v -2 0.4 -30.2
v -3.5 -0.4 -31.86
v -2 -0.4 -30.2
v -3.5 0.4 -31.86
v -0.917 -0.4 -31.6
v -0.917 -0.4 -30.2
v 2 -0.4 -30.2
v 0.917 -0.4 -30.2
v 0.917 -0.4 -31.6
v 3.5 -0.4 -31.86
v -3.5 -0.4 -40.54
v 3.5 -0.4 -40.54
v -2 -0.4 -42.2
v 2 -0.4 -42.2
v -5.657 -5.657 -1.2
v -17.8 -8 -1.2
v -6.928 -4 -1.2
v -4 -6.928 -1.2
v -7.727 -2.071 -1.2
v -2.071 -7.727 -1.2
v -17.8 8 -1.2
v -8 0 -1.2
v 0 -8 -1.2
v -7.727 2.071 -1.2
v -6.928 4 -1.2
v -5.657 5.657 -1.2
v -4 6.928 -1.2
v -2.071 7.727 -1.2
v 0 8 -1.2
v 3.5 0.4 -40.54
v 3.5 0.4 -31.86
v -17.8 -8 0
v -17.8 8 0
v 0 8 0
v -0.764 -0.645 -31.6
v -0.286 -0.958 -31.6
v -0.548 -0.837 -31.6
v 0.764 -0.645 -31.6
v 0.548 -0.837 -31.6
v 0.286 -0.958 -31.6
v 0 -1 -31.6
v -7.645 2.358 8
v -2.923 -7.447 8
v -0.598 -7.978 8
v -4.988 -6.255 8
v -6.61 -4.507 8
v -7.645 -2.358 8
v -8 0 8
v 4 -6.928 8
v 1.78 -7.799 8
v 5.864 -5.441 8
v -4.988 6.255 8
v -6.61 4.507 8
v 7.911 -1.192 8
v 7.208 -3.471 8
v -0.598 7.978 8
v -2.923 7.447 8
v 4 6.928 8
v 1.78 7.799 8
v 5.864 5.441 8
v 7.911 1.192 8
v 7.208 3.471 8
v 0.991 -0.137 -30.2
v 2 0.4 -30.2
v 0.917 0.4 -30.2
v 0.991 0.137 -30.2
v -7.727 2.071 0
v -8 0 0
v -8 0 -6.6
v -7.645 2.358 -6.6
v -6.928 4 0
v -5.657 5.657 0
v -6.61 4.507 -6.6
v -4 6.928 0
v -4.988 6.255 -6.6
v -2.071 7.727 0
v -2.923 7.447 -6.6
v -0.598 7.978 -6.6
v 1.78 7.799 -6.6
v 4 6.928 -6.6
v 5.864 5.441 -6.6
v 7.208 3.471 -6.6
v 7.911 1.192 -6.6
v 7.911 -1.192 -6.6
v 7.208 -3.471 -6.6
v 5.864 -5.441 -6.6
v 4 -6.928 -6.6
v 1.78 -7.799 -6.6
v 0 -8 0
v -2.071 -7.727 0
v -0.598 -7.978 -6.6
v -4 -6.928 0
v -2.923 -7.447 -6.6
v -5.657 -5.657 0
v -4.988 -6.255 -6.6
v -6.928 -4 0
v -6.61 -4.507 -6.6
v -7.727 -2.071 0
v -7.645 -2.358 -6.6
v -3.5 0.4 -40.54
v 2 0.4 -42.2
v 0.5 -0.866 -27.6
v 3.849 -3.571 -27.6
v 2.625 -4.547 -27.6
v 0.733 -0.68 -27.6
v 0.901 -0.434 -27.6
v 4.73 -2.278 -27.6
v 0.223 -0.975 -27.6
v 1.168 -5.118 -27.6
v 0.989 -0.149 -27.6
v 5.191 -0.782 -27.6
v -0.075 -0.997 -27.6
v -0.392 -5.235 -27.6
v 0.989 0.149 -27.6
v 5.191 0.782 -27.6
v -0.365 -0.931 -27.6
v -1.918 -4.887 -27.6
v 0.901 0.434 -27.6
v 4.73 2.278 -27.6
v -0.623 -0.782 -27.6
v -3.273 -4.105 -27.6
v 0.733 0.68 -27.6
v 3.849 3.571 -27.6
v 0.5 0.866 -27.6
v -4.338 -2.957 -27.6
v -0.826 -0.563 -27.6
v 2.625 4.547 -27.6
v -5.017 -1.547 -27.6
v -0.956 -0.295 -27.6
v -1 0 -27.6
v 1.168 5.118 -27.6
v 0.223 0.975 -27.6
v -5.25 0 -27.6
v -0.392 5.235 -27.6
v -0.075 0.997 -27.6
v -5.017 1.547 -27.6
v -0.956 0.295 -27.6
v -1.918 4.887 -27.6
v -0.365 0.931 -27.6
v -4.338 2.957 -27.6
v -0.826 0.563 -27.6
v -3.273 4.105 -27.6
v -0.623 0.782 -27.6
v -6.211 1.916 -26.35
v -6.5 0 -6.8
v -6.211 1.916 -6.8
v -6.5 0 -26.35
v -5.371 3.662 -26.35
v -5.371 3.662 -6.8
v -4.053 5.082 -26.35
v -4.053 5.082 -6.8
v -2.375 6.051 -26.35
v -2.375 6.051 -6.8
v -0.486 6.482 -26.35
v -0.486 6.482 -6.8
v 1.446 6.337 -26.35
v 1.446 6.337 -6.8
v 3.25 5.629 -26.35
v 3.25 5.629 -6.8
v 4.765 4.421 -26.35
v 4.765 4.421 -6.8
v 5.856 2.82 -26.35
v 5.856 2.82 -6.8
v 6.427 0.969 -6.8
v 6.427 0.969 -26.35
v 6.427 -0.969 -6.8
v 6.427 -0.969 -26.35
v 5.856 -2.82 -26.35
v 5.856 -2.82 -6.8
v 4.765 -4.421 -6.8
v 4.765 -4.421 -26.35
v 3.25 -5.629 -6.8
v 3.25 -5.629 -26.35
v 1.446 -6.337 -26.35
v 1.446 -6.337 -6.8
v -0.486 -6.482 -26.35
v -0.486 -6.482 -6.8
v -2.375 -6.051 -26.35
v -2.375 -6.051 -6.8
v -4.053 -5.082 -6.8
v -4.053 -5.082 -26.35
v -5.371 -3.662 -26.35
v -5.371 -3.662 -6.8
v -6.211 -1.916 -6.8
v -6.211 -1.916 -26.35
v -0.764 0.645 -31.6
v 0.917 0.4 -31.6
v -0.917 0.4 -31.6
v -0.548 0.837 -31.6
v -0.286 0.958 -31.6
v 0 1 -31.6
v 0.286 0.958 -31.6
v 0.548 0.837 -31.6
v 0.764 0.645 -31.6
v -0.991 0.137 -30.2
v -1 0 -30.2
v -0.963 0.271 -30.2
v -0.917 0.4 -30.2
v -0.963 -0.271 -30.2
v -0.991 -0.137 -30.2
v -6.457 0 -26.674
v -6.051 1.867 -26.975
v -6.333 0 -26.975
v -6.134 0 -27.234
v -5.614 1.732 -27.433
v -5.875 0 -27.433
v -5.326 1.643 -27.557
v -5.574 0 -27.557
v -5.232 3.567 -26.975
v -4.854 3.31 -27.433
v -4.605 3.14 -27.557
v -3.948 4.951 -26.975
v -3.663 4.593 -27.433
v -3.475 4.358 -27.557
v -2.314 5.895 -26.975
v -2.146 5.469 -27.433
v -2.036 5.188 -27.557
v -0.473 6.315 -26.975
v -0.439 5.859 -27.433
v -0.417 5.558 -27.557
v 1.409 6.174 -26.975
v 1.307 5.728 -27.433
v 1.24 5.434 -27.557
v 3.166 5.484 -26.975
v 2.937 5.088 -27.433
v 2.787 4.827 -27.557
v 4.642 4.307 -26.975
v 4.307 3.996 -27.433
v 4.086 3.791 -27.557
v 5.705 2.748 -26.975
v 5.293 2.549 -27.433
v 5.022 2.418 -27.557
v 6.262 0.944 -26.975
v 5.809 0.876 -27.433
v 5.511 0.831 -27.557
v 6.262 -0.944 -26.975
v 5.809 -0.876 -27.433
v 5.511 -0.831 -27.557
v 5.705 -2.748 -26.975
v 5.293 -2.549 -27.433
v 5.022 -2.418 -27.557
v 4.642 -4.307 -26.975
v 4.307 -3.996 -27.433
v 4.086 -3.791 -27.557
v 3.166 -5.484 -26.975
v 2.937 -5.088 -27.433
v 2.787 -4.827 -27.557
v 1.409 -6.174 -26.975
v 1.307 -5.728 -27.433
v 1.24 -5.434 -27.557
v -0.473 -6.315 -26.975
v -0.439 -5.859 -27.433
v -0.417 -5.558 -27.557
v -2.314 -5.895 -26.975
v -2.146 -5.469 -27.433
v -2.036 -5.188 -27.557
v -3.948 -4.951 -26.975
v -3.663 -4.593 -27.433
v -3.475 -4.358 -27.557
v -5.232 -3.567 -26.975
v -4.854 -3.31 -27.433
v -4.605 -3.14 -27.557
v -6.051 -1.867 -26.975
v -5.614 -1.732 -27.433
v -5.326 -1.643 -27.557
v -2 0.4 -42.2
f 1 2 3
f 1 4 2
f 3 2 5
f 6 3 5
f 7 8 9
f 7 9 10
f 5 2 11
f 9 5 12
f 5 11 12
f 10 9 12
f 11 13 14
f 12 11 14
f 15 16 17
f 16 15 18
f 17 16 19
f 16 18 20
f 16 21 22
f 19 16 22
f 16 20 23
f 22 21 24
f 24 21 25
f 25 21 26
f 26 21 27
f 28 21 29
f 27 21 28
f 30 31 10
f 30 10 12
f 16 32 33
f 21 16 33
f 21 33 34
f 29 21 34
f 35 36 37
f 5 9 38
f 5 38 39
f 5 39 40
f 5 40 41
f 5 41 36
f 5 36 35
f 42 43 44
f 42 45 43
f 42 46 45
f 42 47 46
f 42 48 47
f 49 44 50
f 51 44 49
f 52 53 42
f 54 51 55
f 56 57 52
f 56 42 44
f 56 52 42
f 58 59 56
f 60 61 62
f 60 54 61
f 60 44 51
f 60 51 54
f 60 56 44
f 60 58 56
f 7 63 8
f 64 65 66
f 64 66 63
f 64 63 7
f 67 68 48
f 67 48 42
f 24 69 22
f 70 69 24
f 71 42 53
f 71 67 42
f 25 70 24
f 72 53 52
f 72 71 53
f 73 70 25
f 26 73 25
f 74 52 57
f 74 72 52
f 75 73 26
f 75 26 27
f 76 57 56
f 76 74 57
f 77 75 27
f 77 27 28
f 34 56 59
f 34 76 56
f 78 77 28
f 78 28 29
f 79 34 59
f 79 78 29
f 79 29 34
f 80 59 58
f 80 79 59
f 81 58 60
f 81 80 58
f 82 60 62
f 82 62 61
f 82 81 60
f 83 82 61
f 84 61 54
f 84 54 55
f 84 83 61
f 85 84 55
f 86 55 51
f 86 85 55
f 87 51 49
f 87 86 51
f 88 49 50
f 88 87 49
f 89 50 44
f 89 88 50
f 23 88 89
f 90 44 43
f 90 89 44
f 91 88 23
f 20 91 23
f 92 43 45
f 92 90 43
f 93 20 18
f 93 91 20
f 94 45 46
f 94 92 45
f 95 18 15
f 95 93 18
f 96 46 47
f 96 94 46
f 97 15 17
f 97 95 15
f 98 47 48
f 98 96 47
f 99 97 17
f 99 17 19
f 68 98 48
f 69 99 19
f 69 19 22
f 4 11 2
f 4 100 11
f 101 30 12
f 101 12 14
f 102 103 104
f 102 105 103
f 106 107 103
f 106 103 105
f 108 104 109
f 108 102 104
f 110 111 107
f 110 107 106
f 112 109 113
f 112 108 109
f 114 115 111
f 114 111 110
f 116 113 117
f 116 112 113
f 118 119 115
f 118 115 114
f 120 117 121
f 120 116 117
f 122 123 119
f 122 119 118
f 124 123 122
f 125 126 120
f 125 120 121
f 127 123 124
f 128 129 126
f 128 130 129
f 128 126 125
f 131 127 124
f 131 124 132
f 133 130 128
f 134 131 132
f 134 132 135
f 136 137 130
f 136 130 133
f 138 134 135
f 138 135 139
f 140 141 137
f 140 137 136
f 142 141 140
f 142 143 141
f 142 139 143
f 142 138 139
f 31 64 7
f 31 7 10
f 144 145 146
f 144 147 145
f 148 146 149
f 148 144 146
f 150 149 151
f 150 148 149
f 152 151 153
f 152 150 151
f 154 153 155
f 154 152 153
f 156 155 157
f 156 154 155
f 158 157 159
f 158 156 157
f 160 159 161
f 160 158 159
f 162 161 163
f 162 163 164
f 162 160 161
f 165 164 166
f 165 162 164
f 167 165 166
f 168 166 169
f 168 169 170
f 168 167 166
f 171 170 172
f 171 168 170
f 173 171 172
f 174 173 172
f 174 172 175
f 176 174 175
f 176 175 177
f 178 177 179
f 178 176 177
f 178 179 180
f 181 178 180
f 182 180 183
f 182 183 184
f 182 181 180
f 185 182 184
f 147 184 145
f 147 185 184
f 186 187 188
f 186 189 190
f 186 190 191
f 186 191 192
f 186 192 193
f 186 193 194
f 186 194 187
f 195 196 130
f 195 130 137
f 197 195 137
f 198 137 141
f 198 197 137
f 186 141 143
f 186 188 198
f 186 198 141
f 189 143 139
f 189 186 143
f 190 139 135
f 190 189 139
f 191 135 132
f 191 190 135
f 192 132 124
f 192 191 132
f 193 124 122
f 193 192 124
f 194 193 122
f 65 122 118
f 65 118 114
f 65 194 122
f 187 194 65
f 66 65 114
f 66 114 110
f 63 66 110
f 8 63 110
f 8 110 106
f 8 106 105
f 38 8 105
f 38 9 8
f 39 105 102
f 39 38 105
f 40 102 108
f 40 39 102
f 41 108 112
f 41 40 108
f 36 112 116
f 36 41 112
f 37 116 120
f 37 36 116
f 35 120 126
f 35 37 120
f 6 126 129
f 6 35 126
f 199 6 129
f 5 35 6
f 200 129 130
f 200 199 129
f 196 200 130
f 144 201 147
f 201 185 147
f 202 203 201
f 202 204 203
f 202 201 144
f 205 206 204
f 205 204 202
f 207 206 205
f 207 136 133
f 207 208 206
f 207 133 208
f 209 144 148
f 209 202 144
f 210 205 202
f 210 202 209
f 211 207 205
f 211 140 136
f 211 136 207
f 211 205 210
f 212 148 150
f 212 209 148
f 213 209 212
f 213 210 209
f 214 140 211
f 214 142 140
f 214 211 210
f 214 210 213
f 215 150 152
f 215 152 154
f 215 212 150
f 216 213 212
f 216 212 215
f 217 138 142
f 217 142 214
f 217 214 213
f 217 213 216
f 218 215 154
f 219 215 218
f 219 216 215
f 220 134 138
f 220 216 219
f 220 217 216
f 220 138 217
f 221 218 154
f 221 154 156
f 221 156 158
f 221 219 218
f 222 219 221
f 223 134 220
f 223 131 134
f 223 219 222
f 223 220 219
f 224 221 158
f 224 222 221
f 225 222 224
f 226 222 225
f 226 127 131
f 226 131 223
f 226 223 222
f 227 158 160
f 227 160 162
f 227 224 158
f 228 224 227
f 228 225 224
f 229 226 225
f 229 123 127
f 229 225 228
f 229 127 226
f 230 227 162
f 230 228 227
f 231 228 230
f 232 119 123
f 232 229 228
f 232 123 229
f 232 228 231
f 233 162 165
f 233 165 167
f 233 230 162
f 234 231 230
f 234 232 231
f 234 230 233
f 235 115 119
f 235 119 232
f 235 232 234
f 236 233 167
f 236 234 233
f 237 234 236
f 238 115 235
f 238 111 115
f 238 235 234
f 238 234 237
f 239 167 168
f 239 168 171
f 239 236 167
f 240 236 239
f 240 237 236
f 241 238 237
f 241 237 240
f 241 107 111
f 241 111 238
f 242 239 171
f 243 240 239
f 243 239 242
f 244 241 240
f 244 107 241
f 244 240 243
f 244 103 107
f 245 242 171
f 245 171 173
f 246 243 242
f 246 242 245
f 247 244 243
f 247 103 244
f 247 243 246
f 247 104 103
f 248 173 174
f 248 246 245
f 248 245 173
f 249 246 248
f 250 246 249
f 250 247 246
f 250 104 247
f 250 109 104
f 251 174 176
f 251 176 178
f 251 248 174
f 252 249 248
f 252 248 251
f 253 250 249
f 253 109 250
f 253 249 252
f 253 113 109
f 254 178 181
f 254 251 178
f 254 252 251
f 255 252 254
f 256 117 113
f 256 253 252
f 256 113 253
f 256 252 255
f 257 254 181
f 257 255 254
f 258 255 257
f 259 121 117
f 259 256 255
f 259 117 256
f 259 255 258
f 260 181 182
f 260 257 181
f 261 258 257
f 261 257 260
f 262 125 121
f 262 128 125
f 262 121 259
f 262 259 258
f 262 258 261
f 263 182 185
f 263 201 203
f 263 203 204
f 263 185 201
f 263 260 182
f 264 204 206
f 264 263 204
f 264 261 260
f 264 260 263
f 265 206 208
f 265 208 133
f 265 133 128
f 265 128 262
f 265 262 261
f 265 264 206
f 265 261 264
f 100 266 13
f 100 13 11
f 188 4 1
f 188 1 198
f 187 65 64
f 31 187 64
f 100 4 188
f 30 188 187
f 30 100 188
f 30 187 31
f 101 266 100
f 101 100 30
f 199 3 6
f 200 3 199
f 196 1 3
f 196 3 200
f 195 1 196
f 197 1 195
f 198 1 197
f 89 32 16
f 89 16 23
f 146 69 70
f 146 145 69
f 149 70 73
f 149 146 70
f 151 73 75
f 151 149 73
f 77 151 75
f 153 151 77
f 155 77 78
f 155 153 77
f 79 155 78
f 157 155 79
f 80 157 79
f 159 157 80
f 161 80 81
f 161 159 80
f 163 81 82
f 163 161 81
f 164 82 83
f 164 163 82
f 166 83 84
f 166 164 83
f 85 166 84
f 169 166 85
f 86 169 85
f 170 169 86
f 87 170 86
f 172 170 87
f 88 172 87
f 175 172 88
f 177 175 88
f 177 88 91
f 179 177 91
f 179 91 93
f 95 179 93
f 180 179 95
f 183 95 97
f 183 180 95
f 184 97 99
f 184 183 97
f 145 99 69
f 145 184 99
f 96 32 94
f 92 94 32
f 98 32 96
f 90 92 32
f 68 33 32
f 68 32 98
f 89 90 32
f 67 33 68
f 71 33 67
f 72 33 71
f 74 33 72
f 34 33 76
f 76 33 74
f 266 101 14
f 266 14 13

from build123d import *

# Parameters (mm, degrees)
SKETCH3_W           = 17.8
SKETCH3_H           = 16
BOSS_EXTRUDE1_DEPTH = 1.2
BOSS_EXTRUDE2_DEPTH = 0.4


with BuildPart() as part:
    # Sketch2 → Revolve1 (revolve)
    with BuildSketch(Plane(origin=(0, 0, 0), x_dir=(1, 0, 0), z_dir=(0, 1, 0))):
        with BuildLine():
            Line((0, -8), (-8, -8))
            Line((-8, -8), (-8, 6.6))
            Line((-8, 6.6), (-6.5, 6.8))
            Line((-6.5, 6.8), (-6.5, 26.35))
            ThreePointArc((-6.5, 26.35), (-6.133883476, 27.233883476), (-5.25, 27.6))
            Line((-5.25, 27.6), (-1, 27.6))
            Line((-1, 27.6), (-1, 31.6))
            Line((-1, 31.6), (0, 31.6))
            Line((0, 31.6), (0, -8))
        make_face()
    revolve(axis=Axis((0, 0, 8), (0, 0, -1)))

    # Sketch3 → Boss-Extrude1 (add)
    with BuildSketch(Plane.XY):
        with Locations((-8.9, 0)):
            Rectangle(SKETCH3_W, SKETCH3_H)
    extrude(amount=-BOSS_EXTRUDE1_DEPTH)

    # Sketch5 → Boss-Extrude2 (add, symmetric)
    with BuildSketch(Plane(origin=(0, 0, 0), x_dir=(1, 0, 0), z_dir=(0, 1, 0))):
        Polygon((-2, 30.2), (2, 30.2), (3.5, 31.859853002), (3.5, 40.540146998), (2, 42.2), (-2, 42.2), (-3.5, 40.540146998), (-3.5, 31.859853002), align=None)
    extrude(amount=BOSS_EXTRUDE2_DEPTH, both=True)


solid = part.part
